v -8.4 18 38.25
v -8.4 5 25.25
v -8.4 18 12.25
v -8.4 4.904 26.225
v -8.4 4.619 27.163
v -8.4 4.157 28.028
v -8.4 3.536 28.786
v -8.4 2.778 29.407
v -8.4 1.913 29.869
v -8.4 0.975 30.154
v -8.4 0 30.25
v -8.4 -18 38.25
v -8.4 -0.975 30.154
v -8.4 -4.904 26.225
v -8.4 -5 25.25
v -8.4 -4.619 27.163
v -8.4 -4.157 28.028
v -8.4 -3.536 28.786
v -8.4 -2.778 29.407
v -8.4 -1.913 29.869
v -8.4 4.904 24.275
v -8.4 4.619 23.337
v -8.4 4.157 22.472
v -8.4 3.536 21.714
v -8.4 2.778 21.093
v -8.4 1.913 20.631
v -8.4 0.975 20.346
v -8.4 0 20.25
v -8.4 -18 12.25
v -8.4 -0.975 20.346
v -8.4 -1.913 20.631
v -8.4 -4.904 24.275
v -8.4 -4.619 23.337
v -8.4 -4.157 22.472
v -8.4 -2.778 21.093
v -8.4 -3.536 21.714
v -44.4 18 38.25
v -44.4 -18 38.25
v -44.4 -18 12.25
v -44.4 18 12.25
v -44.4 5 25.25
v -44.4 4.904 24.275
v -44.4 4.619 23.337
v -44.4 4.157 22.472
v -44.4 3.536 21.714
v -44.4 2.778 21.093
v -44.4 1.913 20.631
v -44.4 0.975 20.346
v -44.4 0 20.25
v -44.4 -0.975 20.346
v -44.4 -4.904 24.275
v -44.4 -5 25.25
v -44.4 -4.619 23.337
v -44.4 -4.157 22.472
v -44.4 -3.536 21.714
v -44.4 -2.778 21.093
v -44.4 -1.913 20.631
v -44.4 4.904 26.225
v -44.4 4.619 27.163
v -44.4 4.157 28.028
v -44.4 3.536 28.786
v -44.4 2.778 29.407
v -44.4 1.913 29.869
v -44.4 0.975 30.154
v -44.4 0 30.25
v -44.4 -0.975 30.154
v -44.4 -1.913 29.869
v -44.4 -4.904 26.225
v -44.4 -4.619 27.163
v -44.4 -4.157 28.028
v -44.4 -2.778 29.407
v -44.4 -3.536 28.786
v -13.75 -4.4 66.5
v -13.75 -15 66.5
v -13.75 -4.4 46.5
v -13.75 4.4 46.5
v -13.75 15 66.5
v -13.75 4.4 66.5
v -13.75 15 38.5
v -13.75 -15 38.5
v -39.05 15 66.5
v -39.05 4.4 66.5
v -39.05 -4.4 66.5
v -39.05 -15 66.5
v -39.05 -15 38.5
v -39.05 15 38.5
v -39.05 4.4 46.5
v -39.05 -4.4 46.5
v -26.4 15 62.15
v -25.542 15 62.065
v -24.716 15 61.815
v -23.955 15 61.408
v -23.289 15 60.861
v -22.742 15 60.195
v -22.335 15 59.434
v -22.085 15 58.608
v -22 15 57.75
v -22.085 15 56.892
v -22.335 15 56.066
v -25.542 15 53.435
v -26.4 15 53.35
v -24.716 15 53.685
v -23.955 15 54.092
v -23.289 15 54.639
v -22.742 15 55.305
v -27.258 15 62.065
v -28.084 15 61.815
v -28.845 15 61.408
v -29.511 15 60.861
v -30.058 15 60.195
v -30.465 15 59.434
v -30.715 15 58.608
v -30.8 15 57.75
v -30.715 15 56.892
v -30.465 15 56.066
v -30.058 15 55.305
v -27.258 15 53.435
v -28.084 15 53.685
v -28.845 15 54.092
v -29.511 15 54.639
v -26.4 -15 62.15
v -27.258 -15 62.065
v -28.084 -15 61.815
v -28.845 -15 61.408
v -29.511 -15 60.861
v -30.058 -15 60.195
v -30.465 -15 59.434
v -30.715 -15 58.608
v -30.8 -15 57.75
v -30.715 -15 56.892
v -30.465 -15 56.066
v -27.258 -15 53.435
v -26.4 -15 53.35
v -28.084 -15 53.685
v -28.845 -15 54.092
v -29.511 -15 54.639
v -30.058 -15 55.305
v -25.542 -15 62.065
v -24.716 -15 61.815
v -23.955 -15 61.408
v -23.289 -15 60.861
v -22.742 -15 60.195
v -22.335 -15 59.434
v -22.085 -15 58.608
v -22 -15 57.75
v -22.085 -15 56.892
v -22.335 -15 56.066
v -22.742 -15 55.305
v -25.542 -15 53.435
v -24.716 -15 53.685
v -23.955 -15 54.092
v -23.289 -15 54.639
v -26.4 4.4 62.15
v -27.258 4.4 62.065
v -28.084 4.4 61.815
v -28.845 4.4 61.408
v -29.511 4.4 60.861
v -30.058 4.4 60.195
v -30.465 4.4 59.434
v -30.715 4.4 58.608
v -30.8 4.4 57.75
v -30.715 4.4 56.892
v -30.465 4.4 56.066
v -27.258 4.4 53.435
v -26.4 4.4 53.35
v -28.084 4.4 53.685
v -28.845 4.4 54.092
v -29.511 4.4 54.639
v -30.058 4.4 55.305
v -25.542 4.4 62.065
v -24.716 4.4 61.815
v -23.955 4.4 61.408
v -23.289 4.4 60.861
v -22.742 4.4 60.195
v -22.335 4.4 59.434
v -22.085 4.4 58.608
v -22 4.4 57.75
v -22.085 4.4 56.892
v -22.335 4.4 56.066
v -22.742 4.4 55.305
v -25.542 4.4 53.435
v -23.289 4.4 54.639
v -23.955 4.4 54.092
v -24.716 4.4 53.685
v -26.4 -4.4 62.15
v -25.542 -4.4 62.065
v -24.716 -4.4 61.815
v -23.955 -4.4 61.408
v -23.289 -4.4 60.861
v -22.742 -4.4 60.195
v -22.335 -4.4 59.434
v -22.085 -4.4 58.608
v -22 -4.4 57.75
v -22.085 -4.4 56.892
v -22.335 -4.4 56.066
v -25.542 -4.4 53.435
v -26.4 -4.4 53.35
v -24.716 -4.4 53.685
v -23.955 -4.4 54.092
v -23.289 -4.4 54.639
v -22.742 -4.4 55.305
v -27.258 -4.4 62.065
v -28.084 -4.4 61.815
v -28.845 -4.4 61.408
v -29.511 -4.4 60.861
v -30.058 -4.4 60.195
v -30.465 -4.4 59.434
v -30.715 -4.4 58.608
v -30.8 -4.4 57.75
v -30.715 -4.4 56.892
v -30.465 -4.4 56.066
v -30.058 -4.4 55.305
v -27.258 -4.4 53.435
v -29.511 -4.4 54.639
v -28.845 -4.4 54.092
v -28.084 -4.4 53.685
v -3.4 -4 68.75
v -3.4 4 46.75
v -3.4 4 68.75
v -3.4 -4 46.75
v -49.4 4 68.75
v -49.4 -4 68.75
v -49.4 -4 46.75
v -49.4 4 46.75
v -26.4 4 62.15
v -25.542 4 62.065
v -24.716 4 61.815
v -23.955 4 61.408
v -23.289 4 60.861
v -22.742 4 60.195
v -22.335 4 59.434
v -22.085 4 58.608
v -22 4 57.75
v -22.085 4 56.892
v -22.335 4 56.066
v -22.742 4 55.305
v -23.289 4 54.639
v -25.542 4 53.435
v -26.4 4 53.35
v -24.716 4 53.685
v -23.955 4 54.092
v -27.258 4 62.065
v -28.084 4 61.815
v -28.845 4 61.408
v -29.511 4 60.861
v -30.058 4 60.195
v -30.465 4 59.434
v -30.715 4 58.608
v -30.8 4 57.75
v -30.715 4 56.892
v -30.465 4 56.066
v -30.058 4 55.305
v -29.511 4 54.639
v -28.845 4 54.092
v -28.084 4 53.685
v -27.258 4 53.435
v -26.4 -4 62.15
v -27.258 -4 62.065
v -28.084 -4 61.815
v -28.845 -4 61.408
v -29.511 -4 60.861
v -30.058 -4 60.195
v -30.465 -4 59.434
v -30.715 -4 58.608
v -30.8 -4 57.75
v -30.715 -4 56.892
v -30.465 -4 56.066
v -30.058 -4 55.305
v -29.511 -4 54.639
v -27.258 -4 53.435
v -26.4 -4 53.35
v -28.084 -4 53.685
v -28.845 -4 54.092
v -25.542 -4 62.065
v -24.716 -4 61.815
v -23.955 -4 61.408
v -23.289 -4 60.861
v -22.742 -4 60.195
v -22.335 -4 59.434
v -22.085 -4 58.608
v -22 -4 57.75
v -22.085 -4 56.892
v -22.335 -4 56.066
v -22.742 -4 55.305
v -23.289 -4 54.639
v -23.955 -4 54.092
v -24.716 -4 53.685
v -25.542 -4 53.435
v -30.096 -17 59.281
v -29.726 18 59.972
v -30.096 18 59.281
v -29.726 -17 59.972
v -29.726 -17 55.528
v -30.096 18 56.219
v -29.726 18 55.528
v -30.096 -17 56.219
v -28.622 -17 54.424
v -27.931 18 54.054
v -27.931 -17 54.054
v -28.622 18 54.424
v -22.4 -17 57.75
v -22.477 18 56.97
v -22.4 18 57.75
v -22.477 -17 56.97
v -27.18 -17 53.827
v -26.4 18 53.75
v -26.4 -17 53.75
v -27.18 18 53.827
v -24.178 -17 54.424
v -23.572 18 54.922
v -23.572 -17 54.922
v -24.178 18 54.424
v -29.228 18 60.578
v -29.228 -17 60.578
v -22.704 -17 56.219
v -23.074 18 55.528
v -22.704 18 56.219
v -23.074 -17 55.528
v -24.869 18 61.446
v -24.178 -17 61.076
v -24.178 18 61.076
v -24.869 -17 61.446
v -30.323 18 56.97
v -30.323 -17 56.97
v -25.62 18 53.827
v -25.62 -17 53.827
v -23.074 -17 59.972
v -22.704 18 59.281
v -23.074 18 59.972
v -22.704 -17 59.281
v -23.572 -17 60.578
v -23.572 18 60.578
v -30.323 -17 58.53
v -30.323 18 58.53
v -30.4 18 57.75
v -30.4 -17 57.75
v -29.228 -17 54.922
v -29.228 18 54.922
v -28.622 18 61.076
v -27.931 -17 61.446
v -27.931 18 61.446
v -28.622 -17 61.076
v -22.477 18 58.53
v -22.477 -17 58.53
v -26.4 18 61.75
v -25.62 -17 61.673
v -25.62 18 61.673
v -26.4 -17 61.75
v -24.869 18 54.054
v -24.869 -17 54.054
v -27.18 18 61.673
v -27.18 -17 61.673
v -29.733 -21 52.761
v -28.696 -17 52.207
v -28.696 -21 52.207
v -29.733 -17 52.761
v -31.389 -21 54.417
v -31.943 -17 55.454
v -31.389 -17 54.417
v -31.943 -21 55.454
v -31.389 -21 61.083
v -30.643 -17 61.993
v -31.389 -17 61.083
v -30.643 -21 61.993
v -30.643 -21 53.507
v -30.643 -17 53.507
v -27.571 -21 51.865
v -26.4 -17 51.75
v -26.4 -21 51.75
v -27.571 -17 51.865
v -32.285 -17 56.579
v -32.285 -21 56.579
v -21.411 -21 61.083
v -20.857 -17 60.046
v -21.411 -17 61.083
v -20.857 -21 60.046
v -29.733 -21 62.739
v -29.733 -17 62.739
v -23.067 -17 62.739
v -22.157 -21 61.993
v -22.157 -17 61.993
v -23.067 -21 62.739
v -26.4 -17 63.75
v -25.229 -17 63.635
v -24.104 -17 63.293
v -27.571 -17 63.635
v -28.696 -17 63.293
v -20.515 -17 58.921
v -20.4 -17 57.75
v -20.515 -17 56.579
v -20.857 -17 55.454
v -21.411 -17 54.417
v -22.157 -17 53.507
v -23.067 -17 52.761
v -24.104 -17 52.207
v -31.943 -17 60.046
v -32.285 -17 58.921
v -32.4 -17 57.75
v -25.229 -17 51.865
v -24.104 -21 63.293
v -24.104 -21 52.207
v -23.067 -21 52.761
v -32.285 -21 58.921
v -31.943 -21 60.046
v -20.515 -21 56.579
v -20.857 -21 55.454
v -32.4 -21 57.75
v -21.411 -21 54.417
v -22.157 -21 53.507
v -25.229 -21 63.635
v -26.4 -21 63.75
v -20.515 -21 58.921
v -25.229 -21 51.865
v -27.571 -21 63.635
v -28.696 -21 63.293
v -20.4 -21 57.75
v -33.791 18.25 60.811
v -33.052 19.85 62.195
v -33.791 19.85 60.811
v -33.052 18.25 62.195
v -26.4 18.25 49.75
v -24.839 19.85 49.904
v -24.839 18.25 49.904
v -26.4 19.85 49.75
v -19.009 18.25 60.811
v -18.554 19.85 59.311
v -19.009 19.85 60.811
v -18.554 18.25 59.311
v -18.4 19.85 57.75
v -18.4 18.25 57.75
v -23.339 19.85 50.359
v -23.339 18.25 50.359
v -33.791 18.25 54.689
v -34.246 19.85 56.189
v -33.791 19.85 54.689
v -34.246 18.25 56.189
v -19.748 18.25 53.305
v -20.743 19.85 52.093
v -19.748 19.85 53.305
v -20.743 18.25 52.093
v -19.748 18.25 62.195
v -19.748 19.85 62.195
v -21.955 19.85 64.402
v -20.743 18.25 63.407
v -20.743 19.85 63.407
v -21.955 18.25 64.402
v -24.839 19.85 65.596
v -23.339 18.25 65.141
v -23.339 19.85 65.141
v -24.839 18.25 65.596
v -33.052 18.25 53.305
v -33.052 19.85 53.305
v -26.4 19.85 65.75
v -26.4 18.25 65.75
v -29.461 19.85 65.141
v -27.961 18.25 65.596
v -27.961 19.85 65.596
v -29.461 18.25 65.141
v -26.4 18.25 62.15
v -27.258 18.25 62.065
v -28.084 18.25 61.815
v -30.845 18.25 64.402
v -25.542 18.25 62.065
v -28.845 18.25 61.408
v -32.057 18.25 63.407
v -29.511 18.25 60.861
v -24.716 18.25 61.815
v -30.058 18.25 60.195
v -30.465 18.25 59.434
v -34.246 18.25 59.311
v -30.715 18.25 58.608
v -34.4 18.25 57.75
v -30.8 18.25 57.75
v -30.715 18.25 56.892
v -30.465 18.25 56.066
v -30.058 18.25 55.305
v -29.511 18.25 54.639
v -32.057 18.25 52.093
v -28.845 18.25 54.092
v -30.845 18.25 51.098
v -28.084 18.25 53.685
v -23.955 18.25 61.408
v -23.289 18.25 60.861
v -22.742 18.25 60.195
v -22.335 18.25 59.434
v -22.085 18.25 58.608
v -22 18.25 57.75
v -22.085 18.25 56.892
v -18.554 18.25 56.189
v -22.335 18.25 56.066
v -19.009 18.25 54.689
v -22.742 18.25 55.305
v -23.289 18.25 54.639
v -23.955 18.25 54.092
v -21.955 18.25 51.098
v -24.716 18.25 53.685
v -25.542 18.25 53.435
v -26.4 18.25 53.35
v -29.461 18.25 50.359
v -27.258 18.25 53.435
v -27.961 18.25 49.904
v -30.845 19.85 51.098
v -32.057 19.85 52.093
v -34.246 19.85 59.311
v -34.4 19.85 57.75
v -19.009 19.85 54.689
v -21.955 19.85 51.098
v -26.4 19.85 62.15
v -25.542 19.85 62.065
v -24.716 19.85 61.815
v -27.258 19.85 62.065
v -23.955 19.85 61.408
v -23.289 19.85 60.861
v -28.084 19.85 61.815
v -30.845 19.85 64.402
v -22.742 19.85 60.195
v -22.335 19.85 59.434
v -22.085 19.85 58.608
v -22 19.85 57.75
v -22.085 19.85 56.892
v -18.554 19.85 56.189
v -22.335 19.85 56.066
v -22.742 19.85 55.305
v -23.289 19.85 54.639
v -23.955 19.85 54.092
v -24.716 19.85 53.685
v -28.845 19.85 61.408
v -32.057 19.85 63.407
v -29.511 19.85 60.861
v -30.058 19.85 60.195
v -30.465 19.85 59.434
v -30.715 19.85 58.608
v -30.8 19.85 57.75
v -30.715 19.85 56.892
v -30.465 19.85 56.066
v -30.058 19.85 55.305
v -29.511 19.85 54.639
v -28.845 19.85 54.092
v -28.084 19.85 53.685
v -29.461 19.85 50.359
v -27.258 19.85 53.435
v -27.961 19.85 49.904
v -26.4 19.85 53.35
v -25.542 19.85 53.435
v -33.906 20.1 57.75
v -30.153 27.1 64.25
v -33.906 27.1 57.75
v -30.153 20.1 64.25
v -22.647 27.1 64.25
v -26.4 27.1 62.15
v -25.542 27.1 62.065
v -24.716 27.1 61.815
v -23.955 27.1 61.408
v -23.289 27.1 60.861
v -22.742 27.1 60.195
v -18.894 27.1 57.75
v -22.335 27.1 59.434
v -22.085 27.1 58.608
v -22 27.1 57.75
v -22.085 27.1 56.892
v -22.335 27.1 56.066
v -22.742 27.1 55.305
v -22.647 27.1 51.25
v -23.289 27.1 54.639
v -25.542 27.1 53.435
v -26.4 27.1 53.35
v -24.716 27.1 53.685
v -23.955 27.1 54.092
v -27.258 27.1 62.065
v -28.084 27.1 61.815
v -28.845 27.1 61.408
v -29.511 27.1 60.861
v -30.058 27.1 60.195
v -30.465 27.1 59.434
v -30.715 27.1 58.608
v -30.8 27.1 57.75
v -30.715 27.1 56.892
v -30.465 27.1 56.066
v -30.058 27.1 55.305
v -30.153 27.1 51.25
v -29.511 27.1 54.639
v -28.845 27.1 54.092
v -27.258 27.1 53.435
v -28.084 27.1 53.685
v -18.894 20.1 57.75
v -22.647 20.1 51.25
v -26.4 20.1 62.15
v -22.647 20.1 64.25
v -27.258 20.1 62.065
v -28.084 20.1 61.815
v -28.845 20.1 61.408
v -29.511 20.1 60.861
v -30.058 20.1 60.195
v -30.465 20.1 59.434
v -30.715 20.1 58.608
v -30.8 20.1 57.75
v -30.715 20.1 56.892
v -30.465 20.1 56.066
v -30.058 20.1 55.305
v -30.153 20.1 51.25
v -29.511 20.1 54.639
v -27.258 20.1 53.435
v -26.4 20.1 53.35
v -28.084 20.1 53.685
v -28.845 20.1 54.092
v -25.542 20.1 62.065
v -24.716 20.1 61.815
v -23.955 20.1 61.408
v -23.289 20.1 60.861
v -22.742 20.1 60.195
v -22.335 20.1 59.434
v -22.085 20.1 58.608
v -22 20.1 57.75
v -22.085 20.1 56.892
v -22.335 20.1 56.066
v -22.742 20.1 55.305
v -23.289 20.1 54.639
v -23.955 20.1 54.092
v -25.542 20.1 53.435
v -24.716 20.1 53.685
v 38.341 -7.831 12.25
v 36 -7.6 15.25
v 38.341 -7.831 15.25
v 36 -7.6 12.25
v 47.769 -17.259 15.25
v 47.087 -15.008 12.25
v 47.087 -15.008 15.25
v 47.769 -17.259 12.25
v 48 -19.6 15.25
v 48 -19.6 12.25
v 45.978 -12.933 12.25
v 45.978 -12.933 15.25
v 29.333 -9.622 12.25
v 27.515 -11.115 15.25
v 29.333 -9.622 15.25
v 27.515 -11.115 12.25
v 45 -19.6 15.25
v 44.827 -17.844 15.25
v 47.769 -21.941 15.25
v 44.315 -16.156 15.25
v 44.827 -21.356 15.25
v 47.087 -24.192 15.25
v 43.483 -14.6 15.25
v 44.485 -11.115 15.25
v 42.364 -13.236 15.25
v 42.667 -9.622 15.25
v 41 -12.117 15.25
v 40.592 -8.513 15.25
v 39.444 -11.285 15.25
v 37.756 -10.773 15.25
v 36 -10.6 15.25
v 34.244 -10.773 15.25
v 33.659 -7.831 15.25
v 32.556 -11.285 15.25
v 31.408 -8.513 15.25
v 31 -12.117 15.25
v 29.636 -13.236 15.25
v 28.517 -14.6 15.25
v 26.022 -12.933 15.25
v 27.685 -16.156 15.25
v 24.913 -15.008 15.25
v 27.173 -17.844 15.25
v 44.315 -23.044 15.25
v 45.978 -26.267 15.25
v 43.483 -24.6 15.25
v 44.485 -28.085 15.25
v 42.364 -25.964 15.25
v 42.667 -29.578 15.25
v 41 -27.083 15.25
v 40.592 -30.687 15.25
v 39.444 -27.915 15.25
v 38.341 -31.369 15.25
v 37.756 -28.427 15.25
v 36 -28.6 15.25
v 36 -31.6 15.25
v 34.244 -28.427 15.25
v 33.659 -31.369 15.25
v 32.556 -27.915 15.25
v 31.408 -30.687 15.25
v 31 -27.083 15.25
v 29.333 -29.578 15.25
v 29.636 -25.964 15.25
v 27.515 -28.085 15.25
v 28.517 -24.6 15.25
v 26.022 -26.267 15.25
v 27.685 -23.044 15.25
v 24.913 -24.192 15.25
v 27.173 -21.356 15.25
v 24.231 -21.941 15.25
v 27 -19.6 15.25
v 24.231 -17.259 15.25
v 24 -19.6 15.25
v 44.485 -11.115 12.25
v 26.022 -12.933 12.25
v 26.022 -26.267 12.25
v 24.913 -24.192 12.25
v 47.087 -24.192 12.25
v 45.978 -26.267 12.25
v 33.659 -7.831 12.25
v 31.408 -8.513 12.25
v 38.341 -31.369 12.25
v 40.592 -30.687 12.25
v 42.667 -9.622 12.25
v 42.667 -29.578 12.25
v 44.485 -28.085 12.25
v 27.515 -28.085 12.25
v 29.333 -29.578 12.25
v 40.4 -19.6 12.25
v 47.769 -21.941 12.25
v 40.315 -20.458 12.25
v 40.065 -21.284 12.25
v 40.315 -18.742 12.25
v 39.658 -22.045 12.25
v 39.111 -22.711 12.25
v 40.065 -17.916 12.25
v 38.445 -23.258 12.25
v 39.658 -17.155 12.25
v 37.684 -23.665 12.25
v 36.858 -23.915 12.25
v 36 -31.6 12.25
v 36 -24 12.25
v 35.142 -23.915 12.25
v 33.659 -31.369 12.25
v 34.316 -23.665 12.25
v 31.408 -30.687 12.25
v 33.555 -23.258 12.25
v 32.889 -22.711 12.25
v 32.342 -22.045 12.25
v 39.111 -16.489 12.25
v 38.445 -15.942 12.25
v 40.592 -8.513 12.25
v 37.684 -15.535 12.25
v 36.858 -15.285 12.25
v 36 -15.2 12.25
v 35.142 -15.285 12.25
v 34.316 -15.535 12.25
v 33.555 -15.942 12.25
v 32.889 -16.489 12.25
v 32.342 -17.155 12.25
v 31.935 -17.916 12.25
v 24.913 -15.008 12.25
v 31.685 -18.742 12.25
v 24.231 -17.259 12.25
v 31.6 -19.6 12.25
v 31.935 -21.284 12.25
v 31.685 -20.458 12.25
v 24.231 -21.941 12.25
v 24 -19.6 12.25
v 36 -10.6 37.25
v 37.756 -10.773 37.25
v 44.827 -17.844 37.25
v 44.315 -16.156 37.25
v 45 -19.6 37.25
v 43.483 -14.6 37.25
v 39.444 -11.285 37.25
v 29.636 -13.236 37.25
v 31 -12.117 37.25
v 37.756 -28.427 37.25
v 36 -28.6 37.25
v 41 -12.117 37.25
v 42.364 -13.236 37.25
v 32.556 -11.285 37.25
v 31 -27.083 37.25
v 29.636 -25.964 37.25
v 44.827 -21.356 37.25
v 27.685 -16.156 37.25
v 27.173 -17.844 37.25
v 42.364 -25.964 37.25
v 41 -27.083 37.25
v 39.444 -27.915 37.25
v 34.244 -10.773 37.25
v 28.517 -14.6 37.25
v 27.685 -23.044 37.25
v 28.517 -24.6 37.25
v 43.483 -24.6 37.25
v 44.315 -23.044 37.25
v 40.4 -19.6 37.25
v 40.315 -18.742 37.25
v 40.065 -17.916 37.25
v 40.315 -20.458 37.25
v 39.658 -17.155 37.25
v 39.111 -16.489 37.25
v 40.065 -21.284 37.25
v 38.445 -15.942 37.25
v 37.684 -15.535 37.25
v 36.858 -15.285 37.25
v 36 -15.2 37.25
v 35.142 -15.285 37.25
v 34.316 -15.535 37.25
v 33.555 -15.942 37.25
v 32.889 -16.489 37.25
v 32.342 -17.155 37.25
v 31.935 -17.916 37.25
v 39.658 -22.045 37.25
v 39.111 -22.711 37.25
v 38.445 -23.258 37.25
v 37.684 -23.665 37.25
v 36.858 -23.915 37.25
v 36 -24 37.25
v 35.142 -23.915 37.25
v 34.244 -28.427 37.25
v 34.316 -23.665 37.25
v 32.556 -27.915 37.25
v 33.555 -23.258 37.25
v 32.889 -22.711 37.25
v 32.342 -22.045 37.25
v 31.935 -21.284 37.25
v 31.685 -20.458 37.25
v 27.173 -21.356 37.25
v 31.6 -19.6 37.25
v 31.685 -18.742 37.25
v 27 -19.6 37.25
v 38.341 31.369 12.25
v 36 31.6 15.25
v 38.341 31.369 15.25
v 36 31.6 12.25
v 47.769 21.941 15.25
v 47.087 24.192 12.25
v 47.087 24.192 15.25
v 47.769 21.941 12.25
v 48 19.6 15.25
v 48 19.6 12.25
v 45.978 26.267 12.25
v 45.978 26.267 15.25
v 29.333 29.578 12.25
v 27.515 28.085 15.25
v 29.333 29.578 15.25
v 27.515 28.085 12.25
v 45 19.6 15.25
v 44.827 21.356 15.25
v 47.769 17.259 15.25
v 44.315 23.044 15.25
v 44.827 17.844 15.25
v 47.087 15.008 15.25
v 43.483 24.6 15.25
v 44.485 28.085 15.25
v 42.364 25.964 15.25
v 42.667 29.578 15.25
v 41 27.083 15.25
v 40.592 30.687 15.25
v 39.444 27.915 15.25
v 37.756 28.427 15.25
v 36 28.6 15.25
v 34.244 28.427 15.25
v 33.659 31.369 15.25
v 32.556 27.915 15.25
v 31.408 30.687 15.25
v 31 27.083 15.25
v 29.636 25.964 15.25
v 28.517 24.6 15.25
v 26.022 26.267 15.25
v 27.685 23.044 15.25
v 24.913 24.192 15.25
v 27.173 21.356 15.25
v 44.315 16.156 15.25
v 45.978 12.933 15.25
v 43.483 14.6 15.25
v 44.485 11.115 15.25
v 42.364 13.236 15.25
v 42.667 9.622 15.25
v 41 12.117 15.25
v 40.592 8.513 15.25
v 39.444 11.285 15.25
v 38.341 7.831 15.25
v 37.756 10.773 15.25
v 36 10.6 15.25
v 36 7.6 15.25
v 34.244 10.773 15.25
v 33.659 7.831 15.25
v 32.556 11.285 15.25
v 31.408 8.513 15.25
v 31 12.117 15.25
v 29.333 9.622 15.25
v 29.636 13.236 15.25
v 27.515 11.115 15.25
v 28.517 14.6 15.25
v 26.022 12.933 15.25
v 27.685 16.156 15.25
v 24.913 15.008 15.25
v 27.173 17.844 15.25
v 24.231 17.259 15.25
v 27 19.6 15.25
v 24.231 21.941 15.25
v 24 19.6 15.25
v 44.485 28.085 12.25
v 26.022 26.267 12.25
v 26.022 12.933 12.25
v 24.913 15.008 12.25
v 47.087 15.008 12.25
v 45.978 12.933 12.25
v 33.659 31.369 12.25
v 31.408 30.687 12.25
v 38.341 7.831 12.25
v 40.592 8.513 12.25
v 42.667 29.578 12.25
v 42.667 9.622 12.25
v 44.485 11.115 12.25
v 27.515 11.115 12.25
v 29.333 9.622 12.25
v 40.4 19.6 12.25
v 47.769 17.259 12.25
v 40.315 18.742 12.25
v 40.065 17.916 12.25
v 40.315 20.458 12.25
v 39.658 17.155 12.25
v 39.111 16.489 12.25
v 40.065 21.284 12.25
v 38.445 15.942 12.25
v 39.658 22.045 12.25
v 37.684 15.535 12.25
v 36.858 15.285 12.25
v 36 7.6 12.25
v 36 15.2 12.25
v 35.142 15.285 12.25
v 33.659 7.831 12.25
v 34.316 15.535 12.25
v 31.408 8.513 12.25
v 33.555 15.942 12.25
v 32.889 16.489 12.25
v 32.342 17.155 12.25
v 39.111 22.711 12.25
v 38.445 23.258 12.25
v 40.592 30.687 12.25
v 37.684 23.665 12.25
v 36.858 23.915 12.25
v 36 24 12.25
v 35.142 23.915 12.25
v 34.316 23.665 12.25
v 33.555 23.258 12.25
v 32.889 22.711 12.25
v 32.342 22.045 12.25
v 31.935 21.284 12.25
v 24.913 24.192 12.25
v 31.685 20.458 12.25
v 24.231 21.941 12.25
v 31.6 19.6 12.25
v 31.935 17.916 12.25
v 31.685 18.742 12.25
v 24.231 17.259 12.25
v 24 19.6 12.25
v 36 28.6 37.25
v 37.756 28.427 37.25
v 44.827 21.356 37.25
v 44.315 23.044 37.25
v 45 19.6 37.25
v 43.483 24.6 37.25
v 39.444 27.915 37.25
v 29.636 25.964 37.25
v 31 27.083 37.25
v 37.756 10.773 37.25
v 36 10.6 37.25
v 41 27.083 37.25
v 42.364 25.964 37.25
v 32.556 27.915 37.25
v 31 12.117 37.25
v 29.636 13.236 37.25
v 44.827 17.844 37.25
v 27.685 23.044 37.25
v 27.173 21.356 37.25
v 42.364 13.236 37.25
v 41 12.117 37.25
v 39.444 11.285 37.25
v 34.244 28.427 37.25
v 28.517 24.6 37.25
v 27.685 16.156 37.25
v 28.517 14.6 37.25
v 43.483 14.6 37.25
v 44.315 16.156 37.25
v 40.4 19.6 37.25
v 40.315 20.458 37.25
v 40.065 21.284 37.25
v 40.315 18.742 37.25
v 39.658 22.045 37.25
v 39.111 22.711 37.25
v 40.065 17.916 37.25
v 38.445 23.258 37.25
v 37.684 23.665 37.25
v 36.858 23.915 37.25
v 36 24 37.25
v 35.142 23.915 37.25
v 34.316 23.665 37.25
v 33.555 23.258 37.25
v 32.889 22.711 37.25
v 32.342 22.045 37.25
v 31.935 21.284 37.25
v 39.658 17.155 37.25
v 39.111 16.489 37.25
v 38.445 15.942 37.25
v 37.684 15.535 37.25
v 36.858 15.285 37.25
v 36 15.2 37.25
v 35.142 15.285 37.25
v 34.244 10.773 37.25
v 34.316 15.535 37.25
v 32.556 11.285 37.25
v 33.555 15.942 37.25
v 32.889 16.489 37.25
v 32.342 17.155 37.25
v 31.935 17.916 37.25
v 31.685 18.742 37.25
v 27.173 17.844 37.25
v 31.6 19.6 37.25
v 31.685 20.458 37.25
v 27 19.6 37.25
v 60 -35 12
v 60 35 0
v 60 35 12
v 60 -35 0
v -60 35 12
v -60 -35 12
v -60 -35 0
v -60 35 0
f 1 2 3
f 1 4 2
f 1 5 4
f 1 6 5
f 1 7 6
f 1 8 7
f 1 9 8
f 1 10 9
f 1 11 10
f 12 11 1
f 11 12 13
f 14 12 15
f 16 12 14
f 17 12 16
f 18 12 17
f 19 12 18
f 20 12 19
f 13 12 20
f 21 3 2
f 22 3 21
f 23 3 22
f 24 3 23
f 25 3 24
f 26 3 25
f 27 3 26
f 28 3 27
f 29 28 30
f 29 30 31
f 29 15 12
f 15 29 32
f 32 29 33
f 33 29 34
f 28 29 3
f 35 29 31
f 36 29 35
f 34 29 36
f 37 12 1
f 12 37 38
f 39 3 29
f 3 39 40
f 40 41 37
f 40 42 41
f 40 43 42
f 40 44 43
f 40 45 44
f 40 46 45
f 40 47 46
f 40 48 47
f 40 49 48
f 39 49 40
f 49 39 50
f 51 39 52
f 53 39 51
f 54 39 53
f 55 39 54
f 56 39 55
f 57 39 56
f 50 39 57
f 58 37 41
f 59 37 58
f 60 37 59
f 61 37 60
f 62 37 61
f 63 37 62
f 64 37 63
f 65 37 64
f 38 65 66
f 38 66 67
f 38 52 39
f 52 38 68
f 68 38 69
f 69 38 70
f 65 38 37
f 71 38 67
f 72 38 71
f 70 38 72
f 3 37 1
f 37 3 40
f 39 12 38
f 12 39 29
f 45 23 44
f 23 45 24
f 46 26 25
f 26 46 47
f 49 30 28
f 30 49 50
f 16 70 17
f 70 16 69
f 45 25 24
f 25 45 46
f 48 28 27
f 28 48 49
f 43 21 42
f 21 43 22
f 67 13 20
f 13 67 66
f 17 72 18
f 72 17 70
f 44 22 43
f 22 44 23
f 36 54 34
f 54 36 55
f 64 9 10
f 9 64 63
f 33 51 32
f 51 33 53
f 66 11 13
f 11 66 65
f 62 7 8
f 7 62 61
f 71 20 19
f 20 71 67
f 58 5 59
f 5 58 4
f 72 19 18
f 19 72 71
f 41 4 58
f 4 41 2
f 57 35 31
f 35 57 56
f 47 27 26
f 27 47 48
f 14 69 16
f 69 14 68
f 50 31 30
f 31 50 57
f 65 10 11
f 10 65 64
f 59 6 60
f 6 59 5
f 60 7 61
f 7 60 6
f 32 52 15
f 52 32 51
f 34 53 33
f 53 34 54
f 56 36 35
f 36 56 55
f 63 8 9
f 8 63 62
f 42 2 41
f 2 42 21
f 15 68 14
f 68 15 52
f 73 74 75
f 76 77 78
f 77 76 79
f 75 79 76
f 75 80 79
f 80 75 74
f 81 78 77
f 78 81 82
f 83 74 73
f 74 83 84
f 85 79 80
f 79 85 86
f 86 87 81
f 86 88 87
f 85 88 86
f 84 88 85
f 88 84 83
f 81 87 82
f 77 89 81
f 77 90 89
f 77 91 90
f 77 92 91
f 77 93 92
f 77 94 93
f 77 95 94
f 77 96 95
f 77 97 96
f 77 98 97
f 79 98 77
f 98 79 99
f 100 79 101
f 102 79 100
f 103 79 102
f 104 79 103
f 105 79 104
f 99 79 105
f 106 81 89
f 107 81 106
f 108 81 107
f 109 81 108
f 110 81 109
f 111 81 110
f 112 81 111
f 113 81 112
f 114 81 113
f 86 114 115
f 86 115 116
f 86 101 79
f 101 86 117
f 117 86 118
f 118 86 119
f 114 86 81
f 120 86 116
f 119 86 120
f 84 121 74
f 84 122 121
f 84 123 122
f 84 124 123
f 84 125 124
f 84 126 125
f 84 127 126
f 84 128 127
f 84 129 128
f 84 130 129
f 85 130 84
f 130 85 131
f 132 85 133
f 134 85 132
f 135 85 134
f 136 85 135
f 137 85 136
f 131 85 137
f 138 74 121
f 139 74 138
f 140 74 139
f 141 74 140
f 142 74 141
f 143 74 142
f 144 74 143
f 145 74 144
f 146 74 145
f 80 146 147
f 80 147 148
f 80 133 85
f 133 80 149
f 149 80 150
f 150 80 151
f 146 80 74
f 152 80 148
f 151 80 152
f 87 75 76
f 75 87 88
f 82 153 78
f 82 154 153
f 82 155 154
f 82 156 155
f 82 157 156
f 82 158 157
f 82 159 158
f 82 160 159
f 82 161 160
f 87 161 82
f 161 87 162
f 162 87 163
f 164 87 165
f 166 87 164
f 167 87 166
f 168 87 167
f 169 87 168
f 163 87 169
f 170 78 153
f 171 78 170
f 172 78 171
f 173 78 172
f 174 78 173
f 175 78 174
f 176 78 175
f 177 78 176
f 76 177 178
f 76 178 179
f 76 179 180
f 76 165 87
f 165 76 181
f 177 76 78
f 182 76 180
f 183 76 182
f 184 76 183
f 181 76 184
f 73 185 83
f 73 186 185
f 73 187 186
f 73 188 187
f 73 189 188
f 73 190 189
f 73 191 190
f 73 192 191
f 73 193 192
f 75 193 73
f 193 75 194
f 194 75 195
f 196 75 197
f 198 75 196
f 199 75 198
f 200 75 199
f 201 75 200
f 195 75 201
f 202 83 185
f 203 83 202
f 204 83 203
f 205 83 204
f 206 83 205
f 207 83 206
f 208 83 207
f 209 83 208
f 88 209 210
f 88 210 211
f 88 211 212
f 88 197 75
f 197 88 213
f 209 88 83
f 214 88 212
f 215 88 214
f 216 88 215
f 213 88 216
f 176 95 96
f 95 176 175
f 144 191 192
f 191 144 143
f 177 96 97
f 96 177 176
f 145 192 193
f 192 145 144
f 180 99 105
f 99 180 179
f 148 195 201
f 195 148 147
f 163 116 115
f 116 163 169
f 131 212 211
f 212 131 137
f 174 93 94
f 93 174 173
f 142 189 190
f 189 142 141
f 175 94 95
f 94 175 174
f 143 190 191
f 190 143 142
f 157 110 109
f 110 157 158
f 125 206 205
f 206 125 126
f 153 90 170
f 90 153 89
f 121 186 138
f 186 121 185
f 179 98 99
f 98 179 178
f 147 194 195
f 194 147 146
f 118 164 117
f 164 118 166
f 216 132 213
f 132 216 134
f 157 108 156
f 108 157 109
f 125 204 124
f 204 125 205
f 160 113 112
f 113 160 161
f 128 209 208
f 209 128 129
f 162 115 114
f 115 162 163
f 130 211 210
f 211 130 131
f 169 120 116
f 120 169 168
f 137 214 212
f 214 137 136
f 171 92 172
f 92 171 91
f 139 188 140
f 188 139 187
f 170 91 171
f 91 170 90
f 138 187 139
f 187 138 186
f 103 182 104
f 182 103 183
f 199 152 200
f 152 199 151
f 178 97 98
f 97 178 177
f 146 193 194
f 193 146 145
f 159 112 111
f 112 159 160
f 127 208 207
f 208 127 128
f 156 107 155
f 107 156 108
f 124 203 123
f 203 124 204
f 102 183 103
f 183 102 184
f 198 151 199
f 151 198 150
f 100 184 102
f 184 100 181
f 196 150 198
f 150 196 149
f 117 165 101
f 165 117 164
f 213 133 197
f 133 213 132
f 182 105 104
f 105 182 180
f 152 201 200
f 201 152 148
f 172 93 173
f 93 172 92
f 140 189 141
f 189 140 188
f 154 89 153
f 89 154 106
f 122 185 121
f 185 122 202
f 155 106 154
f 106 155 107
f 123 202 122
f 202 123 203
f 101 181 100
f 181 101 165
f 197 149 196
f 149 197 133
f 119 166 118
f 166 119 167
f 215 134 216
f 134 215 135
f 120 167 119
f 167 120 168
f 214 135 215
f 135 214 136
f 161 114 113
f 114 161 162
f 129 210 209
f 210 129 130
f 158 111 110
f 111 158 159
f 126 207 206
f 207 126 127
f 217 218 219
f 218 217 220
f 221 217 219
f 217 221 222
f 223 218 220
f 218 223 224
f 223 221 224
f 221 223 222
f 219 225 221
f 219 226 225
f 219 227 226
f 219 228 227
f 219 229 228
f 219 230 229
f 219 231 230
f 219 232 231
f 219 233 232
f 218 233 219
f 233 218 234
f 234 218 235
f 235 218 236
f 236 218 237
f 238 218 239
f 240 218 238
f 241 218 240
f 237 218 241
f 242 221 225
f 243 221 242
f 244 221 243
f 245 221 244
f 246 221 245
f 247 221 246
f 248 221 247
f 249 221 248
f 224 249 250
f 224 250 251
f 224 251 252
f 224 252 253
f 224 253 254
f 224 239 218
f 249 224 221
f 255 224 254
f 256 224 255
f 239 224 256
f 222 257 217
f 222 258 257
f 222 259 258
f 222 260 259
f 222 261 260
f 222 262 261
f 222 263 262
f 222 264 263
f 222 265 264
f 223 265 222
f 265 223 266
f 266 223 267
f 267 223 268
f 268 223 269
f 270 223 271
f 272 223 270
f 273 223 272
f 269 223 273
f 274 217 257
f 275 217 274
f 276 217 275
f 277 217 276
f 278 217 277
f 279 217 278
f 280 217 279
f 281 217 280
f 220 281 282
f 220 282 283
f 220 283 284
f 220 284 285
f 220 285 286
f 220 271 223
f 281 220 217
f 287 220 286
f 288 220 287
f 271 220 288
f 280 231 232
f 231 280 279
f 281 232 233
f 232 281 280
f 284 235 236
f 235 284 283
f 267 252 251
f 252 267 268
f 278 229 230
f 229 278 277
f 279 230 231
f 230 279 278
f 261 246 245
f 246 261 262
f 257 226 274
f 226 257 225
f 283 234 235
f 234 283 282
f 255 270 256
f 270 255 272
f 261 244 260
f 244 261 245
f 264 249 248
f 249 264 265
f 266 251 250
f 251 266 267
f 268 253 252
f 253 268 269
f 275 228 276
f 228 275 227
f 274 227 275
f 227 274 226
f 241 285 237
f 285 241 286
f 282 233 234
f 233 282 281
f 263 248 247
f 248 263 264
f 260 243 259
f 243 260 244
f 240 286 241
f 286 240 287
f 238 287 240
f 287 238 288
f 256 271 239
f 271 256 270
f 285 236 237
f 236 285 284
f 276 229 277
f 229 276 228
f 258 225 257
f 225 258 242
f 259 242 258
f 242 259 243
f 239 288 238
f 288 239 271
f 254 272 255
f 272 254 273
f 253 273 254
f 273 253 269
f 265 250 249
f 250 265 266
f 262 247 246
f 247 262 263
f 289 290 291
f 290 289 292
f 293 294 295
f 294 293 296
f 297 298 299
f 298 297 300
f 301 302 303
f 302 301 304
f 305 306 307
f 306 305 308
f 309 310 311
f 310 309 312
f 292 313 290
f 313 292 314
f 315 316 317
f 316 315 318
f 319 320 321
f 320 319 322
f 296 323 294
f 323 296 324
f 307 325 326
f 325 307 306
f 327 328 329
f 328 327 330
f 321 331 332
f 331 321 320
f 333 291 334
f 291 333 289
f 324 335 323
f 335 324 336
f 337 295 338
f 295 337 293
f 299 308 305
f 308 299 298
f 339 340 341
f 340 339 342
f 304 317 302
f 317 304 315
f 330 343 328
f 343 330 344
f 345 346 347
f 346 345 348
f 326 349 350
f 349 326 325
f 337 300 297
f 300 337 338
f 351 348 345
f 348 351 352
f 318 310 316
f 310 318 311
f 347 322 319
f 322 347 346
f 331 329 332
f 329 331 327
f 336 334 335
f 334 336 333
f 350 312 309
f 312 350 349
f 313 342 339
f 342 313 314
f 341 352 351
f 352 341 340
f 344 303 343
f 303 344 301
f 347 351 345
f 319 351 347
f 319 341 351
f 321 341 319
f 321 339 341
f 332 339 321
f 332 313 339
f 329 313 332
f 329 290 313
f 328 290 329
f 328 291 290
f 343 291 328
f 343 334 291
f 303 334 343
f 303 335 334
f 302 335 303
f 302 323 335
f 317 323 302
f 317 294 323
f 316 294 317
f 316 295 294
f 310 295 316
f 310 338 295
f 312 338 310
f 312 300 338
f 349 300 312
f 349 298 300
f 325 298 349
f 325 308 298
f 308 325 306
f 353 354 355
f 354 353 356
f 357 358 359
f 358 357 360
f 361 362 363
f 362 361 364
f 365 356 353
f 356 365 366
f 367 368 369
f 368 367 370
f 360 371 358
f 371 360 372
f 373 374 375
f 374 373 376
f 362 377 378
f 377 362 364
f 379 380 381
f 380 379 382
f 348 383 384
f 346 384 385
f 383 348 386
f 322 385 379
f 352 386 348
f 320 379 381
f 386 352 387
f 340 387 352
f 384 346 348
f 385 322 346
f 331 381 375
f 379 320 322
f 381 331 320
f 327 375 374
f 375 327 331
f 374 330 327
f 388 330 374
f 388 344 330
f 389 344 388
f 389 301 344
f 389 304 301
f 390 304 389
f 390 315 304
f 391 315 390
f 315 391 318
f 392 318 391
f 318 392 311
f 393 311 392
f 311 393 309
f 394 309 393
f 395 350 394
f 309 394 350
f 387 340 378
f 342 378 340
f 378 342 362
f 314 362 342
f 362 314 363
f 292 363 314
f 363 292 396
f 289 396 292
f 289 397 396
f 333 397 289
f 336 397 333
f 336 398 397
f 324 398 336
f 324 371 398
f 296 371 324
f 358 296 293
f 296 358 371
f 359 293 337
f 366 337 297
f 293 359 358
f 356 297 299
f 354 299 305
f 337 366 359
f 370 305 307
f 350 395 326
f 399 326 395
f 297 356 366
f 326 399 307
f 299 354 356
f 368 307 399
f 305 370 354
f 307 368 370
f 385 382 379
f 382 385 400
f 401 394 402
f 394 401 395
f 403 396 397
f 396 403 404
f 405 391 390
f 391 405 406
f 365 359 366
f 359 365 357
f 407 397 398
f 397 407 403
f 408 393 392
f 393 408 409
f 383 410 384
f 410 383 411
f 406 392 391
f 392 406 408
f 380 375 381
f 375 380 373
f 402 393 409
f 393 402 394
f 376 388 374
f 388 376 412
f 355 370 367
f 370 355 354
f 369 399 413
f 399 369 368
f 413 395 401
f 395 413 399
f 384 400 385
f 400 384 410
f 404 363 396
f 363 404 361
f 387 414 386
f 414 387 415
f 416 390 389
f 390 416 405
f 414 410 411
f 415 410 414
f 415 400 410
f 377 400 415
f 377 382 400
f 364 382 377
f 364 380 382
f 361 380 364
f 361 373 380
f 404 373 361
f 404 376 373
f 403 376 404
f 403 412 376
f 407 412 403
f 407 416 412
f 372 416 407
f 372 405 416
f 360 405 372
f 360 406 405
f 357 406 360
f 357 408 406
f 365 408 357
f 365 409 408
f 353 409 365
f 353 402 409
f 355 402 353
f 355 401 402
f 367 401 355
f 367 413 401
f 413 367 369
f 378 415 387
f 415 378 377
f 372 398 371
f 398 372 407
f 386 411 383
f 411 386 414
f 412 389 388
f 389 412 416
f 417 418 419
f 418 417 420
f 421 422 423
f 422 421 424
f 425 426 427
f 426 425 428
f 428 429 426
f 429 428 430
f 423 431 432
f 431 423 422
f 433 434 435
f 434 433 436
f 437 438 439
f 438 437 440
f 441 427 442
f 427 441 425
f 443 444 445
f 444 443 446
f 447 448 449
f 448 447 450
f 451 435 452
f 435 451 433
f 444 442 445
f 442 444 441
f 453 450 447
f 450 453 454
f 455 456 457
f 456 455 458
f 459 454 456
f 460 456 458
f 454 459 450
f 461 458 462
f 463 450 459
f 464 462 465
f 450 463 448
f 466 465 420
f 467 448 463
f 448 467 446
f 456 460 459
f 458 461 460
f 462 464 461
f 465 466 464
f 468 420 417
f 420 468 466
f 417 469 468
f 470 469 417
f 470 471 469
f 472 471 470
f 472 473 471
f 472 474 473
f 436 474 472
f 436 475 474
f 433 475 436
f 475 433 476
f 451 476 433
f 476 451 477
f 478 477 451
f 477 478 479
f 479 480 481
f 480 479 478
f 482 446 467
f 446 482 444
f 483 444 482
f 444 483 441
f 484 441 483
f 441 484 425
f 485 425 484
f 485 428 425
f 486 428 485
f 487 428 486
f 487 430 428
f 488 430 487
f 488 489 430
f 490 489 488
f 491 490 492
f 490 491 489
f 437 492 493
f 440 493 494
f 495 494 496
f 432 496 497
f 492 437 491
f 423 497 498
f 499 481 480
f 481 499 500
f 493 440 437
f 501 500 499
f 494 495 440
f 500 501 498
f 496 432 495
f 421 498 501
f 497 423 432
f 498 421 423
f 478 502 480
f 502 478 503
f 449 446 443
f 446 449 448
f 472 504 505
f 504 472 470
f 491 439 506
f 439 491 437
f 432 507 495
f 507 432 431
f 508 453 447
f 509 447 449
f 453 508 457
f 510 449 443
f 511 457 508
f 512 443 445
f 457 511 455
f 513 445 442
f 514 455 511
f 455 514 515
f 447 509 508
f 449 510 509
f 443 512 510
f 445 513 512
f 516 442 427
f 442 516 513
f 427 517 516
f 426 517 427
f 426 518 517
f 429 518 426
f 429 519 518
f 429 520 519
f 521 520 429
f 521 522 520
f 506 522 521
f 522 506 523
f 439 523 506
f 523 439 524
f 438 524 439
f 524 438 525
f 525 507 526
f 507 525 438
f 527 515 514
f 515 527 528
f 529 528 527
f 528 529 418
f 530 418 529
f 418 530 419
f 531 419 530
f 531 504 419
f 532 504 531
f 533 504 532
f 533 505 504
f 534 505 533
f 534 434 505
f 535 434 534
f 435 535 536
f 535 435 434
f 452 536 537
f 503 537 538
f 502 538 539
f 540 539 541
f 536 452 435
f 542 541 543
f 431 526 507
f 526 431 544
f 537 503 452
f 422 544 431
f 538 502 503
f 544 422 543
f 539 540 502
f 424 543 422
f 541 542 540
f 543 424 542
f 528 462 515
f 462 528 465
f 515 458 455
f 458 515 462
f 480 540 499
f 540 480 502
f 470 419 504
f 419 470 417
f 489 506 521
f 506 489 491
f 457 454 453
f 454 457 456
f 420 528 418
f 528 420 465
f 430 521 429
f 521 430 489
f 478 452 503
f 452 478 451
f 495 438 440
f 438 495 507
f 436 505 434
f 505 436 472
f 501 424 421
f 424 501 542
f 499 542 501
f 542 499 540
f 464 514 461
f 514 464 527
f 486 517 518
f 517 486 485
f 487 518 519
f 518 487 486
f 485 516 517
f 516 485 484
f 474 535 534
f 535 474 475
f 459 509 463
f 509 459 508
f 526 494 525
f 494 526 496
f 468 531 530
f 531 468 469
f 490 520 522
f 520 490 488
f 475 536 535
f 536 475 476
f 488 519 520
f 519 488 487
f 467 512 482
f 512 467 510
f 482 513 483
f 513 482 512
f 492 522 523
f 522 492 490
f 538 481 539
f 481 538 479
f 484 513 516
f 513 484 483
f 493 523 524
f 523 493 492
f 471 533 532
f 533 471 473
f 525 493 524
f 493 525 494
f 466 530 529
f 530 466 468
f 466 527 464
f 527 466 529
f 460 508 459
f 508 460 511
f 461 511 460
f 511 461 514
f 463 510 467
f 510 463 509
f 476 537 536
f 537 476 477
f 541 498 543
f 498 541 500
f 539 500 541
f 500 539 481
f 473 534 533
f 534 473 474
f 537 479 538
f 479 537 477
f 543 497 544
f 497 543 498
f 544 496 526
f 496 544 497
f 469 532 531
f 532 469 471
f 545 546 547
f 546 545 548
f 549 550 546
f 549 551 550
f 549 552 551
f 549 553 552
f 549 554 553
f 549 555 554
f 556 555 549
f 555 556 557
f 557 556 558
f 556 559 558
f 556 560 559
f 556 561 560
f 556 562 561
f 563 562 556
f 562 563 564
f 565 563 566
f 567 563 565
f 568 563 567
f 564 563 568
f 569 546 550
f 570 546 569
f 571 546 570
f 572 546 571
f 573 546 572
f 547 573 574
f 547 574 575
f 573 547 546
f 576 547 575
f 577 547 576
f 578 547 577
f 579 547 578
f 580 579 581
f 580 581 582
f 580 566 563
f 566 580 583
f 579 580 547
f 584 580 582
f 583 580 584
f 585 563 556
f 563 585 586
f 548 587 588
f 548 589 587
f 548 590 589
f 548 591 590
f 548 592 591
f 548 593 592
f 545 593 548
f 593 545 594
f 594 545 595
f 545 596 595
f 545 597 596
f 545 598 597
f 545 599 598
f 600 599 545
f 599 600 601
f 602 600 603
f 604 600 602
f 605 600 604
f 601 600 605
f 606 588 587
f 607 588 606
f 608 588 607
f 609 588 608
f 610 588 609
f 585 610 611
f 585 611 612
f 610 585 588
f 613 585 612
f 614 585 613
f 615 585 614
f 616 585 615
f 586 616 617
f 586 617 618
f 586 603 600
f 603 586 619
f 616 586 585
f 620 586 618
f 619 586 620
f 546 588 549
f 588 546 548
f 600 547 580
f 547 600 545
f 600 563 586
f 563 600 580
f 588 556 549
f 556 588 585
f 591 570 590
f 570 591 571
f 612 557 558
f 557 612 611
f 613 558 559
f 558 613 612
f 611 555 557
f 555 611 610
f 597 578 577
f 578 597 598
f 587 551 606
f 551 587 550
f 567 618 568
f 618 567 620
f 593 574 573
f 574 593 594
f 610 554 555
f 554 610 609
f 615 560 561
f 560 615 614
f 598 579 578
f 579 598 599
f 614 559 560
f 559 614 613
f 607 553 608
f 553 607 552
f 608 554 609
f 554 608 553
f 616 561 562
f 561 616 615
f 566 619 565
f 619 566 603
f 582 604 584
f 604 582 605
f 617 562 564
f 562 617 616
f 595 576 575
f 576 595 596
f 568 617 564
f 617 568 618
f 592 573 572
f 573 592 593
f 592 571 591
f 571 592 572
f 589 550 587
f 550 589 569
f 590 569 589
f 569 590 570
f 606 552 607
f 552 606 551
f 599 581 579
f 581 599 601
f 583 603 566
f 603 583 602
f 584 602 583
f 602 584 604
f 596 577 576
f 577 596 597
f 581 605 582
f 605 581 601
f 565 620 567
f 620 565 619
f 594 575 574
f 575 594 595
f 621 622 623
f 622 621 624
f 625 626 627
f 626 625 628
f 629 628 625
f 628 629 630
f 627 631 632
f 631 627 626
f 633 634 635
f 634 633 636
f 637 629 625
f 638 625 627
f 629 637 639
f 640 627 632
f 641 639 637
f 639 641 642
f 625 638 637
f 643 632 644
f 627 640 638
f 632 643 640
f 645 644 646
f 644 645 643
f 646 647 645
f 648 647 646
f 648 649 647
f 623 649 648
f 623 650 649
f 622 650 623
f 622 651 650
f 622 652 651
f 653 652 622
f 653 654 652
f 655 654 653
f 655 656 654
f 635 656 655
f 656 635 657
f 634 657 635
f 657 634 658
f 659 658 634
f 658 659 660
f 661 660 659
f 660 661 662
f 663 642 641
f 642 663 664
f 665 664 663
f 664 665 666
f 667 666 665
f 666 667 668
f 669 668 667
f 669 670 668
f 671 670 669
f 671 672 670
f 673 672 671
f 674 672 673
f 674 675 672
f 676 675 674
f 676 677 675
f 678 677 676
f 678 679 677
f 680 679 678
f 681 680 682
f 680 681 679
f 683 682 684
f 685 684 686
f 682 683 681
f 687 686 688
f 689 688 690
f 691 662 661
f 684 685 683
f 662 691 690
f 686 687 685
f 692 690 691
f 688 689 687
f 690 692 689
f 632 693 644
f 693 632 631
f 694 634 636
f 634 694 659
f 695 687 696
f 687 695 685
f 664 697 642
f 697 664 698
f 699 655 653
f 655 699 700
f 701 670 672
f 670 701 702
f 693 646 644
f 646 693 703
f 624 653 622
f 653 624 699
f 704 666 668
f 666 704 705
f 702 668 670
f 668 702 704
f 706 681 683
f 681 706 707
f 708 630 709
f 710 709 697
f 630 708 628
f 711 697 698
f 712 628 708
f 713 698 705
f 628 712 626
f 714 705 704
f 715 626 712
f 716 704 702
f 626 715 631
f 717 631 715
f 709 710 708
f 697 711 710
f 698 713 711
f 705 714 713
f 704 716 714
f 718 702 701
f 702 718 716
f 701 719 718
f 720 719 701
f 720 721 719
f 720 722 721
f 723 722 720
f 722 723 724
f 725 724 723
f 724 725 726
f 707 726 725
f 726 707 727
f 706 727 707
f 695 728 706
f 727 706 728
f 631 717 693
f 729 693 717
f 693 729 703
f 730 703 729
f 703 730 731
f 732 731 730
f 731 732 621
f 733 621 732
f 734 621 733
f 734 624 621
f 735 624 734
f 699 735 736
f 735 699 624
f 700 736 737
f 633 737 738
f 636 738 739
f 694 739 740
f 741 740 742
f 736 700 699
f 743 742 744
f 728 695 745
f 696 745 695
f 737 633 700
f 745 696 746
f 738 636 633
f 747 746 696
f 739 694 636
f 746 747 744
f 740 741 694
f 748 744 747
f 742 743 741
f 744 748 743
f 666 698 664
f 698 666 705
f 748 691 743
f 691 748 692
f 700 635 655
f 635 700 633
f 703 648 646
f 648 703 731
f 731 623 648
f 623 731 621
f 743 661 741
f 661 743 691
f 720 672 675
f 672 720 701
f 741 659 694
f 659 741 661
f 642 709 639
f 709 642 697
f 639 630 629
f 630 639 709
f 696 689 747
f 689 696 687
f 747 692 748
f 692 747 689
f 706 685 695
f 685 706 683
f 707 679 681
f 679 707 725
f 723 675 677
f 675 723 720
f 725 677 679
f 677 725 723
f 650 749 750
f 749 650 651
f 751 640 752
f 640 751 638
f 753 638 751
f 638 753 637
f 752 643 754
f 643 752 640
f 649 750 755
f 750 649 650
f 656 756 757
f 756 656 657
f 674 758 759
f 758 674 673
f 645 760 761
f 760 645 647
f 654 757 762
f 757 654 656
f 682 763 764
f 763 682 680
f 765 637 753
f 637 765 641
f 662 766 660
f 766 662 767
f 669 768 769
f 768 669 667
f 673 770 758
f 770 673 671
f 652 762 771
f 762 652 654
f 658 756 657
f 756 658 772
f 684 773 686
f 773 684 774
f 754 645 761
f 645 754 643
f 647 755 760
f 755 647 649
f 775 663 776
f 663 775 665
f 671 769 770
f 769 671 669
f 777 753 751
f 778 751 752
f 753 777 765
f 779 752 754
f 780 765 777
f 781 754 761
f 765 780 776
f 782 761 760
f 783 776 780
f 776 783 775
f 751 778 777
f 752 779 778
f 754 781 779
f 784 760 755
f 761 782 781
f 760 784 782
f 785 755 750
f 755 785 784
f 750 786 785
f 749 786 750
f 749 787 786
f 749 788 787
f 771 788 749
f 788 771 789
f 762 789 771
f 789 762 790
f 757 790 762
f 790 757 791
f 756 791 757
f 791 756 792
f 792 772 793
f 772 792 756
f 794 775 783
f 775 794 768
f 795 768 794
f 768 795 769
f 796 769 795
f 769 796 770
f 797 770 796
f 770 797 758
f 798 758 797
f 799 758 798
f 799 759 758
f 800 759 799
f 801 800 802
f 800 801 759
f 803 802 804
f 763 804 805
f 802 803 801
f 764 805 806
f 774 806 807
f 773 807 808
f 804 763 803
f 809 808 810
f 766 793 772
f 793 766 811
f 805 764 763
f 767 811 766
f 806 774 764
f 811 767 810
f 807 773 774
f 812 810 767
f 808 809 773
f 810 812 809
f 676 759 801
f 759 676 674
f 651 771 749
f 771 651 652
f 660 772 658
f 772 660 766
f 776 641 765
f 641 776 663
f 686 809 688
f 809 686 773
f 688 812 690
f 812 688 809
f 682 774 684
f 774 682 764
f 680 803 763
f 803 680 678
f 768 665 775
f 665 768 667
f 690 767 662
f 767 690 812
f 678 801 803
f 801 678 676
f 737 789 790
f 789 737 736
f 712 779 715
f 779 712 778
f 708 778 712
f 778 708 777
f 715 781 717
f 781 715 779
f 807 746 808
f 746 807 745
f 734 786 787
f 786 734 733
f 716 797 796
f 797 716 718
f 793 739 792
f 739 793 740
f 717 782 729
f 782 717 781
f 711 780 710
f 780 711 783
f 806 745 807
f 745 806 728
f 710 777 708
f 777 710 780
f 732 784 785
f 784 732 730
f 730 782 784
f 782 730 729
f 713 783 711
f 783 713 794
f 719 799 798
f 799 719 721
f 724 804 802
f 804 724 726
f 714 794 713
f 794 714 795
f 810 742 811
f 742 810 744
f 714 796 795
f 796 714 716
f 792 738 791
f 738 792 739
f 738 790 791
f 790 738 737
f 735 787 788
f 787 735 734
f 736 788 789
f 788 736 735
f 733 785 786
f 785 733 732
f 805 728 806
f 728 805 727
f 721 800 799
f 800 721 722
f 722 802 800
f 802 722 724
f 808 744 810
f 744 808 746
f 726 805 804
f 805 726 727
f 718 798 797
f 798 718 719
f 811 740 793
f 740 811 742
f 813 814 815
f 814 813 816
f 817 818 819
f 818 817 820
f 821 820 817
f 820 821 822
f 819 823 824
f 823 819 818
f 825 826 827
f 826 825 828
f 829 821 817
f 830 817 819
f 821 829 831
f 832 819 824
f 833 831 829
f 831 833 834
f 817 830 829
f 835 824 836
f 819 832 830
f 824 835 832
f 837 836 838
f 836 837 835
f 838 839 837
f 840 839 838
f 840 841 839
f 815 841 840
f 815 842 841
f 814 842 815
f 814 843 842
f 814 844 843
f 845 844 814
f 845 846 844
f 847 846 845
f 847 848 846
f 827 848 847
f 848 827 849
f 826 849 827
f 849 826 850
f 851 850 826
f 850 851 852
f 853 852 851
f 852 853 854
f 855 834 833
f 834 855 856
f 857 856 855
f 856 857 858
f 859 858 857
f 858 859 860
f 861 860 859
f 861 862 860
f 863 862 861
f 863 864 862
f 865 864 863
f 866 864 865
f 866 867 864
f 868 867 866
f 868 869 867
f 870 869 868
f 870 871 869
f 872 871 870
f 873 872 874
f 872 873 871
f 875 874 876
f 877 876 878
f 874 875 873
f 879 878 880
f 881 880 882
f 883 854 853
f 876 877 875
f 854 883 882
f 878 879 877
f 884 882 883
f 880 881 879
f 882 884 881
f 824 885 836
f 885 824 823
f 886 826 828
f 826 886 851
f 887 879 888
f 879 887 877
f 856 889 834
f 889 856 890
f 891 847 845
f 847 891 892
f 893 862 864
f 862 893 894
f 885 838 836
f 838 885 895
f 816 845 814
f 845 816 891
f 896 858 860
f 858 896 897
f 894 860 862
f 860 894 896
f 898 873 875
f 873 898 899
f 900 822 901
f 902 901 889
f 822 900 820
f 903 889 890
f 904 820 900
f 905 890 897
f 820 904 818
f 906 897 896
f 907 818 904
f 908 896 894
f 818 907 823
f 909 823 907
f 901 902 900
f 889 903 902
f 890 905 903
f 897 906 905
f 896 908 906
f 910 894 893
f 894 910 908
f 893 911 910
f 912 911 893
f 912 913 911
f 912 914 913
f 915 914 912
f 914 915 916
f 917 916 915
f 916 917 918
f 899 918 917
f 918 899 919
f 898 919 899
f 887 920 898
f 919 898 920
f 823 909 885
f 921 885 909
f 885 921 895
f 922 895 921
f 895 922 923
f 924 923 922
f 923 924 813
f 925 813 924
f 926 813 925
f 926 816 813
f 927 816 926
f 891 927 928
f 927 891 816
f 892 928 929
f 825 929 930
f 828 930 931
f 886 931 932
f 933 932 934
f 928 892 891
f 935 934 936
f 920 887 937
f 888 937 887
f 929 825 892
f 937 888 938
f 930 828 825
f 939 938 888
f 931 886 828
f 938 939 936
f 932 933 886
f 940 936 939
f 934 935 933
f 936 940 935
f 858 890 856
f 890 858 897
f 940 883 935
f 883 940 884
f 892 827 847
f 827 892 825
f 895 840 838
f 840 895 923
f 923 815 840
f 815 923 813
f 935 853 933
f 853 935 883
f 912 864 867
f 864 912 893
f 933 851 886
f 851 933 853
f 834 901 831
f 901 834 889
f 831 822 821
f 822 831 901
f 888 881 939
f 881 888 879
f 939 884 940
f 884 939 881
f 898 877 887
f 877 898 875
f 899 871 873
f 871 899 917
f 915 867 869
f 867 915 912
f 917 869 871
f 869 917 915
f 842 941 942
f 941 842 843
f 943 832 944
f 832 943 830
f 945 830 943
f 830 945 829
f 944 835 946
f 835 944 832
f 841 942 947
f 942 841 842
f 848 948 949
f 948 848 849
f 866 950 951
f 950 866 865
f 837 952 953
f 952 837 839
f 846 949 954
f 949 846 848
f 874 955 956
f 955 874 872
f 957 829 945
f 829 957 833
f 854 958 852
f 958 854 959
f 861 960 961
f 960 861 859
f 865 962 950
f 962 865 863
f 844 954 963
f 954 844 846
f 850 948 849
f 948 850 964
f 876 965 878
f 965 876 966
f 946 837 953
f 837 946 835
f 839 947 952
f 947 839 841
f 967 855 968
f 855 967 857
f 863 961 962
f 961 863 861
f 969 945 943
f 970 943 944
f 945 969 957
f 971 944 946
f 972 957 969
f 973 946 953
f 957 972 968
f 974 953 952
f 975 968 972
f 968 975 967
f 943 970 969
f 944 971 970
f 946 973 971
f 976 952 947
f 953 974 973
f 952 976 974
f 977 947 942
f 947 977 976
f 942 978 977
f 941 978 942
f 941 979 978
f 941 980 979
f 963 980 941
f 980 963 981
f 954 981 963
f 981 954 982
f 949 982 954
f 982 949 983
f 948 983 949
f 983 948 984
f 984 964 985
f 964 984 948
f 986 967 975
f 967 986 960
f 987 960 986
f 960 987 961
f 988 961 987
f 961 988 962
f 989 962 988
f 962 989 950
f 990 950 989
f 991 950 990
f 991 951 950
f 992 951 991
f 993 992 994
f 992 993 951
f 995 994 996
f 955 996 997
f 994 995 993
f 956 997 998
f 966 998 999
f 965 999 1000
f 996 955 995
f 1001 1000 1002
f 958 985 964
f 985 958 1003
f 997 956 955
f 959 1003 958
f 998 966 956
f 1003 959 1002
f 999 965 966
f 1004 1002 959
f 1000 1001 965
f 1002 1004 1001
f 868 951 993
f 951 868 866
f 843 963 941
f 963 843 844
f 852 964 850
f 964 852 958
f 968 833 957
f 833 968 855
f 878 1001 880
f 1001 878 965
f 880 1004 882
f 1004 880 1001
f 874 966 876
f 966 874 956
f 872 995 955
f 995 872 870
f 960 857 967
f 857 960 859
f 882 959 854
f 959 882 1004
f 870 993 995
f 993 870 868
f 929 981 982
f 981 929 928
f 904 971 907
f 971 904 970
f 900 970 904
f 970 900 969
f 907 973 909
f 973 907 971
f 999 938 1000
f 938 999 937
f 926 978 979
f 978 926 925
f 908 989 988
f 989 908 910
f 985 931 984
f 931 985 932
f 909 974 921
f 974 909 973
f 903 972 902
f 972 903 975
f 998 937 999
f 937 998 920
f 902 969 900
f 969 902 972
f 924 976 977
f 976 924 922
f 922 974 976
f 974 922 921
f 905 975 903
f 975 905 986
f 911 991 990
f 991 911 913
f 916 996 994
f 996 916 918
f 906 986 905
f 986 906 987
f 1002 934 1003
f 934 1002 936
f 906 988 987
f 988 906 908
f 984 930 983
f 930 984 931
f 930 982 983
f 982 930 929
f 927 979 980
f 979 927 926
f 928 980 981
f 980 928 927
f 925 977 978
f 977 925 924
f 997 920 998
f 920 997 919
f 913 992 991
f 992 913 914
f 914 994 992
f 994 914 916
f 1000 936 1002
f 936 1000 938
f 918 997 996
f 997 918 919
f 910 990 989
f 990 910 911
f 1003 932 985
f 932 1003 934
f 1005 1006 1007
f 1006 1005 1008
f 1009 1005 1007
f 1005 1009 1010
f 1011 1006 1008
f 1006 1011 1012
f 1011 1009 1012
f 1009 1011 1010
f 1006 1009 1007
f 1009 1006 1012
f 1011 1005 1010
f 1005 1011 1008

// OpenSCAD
$fn = 32;

// ------------------------------------------------------------------------
// Indexing jig: plate 120 x 70 mm, pin d8
// Every part is its own module, assembly() places every instance.
// ------------------------------------------------------------------------

// --- part 1 ---
module jig_plate() {
  difference() {
    translate([-60, -35, 0]) cube([120, 70, 12]);
  }
}

// --- part 2 ---
module locator_block() {
  difference() {
    translate([-18, -18, 0]) cube([36, 36, 26]);
    translate([0, 0, 13]) rotate([0, 90, 0]) cylinder(h = 38, d = 10, center = true);
  }
}

// --- part 3 ---
module index_fork() {
  difference() {
    translate([-12.65, -15, 0]) cube([25.3, 30, 28]);
    translate([-13.65, -4.4, 8]) cube([27.3, 8.8, 21]);
    translate([0, 0, 19.25]) rotate([90, 0, 0]) cylinder(h = 32, d = 8.8, center = true);
  }
}

// --- part 4 ---
module index_arm() {
  difference() {
    translate([-23, -4, 0]) cube([46, 8, 22]);
    translate([0, 0, 11]) rotate([90, 0, 0]) cylinder(h = 10, d = 8.8, center = true);
  }
}

// --- part 5 ---
module index_pin() {
  rotate([0, 90, 0]) cylinder(h = 36, d = 8, center = true);
  translate([-21, 0, 0]) rotate([0, 90, 0]) cylinder(h = 4, d = 12);
}

// --- part 6 ---
module pin_washer() {
  difference() {
      translate([0, 0, 0]) cylinder(h = 1.6, d = 16);
      translate([0, 0, -1]) cylinder(h = 3.6, d = 8.8);
    }
}

// --- part 7 ---
module lock_nut() {
  difference() {
    linear_extrude(height = 7) polygon(points = [[7.506, 0], [3.753, 6.5], [-3.753, 6.5], [-7.506, 0], [-3.753, -6.5], [3.753, -6.5]]);
    translate([0, 0, -1]) cylinder(h = 9, d = 8.8);
  }
}

// --- part 8 ---
module guide_bush_a() {
  difference() {
    union() {
      cylinder(h = 3, d = 24);
      translate([0, 0, 3]) cylinder(h = 22, d = 18);
    }
    translate([0, 0, -1]) cylinder(h = 27, d = 8.8);
  }
}

// --- part 9 ---
module guide_bush_b() {
  difference() {
    union() {
      cylinder(h = 3, d = 24);
      translate([0, 0, 3]) cylinder(h = 22, d = 18);
    }
    translate([0, 0, -1]) cylinder(h = 27, d = 8.8);
  }
}

// --- assembly ---
module assembly() {
  color([0.80, 0.24, 0.20]) translate([0, 0, 0]) rotate([0, 0, 0]) jig_plate();
  color([0.20, 0.45, 0.75]) translate([-26.4, 0, 12.25]) rotate([0, 0, 0]) locator_block();
  color([0.25, 0.62, 0.32]) translate([-26.4, 0, 38.5]) rotate([0, 0, 0]) index_fork();
  color([0.92, 0.70, 0.18]) translate([-26.4, 0, 46.75]) rotate([0, 0, 0]) index_arm();
  color([0.58, 0.35, 0.70]) translate([-26.4, 0, 57.75]) rotate([0, 0, 90]) index_pin();
  color([0.16, 0.66, 0.66]) translate([-26.4, 19.85, 57.75]) rotate([90, 0, 0]) pin_washer();
  color([0.85, 0.48, 0.18]) translate([-26.4, 27.1, 57.75]) rotate([90, 0, 0]) lock_nut();
  color([0.55, 0.60, 0.65]) translate([36, -19.6, 12.25]) rotate([0, 0, 0]) guide_bush_a();
  color([0.75, 0.30, 0.55]) translate([36, 19.6, 12.25]) rotate([0, 0, 0]) guide_bush_b();
}

assembly();
